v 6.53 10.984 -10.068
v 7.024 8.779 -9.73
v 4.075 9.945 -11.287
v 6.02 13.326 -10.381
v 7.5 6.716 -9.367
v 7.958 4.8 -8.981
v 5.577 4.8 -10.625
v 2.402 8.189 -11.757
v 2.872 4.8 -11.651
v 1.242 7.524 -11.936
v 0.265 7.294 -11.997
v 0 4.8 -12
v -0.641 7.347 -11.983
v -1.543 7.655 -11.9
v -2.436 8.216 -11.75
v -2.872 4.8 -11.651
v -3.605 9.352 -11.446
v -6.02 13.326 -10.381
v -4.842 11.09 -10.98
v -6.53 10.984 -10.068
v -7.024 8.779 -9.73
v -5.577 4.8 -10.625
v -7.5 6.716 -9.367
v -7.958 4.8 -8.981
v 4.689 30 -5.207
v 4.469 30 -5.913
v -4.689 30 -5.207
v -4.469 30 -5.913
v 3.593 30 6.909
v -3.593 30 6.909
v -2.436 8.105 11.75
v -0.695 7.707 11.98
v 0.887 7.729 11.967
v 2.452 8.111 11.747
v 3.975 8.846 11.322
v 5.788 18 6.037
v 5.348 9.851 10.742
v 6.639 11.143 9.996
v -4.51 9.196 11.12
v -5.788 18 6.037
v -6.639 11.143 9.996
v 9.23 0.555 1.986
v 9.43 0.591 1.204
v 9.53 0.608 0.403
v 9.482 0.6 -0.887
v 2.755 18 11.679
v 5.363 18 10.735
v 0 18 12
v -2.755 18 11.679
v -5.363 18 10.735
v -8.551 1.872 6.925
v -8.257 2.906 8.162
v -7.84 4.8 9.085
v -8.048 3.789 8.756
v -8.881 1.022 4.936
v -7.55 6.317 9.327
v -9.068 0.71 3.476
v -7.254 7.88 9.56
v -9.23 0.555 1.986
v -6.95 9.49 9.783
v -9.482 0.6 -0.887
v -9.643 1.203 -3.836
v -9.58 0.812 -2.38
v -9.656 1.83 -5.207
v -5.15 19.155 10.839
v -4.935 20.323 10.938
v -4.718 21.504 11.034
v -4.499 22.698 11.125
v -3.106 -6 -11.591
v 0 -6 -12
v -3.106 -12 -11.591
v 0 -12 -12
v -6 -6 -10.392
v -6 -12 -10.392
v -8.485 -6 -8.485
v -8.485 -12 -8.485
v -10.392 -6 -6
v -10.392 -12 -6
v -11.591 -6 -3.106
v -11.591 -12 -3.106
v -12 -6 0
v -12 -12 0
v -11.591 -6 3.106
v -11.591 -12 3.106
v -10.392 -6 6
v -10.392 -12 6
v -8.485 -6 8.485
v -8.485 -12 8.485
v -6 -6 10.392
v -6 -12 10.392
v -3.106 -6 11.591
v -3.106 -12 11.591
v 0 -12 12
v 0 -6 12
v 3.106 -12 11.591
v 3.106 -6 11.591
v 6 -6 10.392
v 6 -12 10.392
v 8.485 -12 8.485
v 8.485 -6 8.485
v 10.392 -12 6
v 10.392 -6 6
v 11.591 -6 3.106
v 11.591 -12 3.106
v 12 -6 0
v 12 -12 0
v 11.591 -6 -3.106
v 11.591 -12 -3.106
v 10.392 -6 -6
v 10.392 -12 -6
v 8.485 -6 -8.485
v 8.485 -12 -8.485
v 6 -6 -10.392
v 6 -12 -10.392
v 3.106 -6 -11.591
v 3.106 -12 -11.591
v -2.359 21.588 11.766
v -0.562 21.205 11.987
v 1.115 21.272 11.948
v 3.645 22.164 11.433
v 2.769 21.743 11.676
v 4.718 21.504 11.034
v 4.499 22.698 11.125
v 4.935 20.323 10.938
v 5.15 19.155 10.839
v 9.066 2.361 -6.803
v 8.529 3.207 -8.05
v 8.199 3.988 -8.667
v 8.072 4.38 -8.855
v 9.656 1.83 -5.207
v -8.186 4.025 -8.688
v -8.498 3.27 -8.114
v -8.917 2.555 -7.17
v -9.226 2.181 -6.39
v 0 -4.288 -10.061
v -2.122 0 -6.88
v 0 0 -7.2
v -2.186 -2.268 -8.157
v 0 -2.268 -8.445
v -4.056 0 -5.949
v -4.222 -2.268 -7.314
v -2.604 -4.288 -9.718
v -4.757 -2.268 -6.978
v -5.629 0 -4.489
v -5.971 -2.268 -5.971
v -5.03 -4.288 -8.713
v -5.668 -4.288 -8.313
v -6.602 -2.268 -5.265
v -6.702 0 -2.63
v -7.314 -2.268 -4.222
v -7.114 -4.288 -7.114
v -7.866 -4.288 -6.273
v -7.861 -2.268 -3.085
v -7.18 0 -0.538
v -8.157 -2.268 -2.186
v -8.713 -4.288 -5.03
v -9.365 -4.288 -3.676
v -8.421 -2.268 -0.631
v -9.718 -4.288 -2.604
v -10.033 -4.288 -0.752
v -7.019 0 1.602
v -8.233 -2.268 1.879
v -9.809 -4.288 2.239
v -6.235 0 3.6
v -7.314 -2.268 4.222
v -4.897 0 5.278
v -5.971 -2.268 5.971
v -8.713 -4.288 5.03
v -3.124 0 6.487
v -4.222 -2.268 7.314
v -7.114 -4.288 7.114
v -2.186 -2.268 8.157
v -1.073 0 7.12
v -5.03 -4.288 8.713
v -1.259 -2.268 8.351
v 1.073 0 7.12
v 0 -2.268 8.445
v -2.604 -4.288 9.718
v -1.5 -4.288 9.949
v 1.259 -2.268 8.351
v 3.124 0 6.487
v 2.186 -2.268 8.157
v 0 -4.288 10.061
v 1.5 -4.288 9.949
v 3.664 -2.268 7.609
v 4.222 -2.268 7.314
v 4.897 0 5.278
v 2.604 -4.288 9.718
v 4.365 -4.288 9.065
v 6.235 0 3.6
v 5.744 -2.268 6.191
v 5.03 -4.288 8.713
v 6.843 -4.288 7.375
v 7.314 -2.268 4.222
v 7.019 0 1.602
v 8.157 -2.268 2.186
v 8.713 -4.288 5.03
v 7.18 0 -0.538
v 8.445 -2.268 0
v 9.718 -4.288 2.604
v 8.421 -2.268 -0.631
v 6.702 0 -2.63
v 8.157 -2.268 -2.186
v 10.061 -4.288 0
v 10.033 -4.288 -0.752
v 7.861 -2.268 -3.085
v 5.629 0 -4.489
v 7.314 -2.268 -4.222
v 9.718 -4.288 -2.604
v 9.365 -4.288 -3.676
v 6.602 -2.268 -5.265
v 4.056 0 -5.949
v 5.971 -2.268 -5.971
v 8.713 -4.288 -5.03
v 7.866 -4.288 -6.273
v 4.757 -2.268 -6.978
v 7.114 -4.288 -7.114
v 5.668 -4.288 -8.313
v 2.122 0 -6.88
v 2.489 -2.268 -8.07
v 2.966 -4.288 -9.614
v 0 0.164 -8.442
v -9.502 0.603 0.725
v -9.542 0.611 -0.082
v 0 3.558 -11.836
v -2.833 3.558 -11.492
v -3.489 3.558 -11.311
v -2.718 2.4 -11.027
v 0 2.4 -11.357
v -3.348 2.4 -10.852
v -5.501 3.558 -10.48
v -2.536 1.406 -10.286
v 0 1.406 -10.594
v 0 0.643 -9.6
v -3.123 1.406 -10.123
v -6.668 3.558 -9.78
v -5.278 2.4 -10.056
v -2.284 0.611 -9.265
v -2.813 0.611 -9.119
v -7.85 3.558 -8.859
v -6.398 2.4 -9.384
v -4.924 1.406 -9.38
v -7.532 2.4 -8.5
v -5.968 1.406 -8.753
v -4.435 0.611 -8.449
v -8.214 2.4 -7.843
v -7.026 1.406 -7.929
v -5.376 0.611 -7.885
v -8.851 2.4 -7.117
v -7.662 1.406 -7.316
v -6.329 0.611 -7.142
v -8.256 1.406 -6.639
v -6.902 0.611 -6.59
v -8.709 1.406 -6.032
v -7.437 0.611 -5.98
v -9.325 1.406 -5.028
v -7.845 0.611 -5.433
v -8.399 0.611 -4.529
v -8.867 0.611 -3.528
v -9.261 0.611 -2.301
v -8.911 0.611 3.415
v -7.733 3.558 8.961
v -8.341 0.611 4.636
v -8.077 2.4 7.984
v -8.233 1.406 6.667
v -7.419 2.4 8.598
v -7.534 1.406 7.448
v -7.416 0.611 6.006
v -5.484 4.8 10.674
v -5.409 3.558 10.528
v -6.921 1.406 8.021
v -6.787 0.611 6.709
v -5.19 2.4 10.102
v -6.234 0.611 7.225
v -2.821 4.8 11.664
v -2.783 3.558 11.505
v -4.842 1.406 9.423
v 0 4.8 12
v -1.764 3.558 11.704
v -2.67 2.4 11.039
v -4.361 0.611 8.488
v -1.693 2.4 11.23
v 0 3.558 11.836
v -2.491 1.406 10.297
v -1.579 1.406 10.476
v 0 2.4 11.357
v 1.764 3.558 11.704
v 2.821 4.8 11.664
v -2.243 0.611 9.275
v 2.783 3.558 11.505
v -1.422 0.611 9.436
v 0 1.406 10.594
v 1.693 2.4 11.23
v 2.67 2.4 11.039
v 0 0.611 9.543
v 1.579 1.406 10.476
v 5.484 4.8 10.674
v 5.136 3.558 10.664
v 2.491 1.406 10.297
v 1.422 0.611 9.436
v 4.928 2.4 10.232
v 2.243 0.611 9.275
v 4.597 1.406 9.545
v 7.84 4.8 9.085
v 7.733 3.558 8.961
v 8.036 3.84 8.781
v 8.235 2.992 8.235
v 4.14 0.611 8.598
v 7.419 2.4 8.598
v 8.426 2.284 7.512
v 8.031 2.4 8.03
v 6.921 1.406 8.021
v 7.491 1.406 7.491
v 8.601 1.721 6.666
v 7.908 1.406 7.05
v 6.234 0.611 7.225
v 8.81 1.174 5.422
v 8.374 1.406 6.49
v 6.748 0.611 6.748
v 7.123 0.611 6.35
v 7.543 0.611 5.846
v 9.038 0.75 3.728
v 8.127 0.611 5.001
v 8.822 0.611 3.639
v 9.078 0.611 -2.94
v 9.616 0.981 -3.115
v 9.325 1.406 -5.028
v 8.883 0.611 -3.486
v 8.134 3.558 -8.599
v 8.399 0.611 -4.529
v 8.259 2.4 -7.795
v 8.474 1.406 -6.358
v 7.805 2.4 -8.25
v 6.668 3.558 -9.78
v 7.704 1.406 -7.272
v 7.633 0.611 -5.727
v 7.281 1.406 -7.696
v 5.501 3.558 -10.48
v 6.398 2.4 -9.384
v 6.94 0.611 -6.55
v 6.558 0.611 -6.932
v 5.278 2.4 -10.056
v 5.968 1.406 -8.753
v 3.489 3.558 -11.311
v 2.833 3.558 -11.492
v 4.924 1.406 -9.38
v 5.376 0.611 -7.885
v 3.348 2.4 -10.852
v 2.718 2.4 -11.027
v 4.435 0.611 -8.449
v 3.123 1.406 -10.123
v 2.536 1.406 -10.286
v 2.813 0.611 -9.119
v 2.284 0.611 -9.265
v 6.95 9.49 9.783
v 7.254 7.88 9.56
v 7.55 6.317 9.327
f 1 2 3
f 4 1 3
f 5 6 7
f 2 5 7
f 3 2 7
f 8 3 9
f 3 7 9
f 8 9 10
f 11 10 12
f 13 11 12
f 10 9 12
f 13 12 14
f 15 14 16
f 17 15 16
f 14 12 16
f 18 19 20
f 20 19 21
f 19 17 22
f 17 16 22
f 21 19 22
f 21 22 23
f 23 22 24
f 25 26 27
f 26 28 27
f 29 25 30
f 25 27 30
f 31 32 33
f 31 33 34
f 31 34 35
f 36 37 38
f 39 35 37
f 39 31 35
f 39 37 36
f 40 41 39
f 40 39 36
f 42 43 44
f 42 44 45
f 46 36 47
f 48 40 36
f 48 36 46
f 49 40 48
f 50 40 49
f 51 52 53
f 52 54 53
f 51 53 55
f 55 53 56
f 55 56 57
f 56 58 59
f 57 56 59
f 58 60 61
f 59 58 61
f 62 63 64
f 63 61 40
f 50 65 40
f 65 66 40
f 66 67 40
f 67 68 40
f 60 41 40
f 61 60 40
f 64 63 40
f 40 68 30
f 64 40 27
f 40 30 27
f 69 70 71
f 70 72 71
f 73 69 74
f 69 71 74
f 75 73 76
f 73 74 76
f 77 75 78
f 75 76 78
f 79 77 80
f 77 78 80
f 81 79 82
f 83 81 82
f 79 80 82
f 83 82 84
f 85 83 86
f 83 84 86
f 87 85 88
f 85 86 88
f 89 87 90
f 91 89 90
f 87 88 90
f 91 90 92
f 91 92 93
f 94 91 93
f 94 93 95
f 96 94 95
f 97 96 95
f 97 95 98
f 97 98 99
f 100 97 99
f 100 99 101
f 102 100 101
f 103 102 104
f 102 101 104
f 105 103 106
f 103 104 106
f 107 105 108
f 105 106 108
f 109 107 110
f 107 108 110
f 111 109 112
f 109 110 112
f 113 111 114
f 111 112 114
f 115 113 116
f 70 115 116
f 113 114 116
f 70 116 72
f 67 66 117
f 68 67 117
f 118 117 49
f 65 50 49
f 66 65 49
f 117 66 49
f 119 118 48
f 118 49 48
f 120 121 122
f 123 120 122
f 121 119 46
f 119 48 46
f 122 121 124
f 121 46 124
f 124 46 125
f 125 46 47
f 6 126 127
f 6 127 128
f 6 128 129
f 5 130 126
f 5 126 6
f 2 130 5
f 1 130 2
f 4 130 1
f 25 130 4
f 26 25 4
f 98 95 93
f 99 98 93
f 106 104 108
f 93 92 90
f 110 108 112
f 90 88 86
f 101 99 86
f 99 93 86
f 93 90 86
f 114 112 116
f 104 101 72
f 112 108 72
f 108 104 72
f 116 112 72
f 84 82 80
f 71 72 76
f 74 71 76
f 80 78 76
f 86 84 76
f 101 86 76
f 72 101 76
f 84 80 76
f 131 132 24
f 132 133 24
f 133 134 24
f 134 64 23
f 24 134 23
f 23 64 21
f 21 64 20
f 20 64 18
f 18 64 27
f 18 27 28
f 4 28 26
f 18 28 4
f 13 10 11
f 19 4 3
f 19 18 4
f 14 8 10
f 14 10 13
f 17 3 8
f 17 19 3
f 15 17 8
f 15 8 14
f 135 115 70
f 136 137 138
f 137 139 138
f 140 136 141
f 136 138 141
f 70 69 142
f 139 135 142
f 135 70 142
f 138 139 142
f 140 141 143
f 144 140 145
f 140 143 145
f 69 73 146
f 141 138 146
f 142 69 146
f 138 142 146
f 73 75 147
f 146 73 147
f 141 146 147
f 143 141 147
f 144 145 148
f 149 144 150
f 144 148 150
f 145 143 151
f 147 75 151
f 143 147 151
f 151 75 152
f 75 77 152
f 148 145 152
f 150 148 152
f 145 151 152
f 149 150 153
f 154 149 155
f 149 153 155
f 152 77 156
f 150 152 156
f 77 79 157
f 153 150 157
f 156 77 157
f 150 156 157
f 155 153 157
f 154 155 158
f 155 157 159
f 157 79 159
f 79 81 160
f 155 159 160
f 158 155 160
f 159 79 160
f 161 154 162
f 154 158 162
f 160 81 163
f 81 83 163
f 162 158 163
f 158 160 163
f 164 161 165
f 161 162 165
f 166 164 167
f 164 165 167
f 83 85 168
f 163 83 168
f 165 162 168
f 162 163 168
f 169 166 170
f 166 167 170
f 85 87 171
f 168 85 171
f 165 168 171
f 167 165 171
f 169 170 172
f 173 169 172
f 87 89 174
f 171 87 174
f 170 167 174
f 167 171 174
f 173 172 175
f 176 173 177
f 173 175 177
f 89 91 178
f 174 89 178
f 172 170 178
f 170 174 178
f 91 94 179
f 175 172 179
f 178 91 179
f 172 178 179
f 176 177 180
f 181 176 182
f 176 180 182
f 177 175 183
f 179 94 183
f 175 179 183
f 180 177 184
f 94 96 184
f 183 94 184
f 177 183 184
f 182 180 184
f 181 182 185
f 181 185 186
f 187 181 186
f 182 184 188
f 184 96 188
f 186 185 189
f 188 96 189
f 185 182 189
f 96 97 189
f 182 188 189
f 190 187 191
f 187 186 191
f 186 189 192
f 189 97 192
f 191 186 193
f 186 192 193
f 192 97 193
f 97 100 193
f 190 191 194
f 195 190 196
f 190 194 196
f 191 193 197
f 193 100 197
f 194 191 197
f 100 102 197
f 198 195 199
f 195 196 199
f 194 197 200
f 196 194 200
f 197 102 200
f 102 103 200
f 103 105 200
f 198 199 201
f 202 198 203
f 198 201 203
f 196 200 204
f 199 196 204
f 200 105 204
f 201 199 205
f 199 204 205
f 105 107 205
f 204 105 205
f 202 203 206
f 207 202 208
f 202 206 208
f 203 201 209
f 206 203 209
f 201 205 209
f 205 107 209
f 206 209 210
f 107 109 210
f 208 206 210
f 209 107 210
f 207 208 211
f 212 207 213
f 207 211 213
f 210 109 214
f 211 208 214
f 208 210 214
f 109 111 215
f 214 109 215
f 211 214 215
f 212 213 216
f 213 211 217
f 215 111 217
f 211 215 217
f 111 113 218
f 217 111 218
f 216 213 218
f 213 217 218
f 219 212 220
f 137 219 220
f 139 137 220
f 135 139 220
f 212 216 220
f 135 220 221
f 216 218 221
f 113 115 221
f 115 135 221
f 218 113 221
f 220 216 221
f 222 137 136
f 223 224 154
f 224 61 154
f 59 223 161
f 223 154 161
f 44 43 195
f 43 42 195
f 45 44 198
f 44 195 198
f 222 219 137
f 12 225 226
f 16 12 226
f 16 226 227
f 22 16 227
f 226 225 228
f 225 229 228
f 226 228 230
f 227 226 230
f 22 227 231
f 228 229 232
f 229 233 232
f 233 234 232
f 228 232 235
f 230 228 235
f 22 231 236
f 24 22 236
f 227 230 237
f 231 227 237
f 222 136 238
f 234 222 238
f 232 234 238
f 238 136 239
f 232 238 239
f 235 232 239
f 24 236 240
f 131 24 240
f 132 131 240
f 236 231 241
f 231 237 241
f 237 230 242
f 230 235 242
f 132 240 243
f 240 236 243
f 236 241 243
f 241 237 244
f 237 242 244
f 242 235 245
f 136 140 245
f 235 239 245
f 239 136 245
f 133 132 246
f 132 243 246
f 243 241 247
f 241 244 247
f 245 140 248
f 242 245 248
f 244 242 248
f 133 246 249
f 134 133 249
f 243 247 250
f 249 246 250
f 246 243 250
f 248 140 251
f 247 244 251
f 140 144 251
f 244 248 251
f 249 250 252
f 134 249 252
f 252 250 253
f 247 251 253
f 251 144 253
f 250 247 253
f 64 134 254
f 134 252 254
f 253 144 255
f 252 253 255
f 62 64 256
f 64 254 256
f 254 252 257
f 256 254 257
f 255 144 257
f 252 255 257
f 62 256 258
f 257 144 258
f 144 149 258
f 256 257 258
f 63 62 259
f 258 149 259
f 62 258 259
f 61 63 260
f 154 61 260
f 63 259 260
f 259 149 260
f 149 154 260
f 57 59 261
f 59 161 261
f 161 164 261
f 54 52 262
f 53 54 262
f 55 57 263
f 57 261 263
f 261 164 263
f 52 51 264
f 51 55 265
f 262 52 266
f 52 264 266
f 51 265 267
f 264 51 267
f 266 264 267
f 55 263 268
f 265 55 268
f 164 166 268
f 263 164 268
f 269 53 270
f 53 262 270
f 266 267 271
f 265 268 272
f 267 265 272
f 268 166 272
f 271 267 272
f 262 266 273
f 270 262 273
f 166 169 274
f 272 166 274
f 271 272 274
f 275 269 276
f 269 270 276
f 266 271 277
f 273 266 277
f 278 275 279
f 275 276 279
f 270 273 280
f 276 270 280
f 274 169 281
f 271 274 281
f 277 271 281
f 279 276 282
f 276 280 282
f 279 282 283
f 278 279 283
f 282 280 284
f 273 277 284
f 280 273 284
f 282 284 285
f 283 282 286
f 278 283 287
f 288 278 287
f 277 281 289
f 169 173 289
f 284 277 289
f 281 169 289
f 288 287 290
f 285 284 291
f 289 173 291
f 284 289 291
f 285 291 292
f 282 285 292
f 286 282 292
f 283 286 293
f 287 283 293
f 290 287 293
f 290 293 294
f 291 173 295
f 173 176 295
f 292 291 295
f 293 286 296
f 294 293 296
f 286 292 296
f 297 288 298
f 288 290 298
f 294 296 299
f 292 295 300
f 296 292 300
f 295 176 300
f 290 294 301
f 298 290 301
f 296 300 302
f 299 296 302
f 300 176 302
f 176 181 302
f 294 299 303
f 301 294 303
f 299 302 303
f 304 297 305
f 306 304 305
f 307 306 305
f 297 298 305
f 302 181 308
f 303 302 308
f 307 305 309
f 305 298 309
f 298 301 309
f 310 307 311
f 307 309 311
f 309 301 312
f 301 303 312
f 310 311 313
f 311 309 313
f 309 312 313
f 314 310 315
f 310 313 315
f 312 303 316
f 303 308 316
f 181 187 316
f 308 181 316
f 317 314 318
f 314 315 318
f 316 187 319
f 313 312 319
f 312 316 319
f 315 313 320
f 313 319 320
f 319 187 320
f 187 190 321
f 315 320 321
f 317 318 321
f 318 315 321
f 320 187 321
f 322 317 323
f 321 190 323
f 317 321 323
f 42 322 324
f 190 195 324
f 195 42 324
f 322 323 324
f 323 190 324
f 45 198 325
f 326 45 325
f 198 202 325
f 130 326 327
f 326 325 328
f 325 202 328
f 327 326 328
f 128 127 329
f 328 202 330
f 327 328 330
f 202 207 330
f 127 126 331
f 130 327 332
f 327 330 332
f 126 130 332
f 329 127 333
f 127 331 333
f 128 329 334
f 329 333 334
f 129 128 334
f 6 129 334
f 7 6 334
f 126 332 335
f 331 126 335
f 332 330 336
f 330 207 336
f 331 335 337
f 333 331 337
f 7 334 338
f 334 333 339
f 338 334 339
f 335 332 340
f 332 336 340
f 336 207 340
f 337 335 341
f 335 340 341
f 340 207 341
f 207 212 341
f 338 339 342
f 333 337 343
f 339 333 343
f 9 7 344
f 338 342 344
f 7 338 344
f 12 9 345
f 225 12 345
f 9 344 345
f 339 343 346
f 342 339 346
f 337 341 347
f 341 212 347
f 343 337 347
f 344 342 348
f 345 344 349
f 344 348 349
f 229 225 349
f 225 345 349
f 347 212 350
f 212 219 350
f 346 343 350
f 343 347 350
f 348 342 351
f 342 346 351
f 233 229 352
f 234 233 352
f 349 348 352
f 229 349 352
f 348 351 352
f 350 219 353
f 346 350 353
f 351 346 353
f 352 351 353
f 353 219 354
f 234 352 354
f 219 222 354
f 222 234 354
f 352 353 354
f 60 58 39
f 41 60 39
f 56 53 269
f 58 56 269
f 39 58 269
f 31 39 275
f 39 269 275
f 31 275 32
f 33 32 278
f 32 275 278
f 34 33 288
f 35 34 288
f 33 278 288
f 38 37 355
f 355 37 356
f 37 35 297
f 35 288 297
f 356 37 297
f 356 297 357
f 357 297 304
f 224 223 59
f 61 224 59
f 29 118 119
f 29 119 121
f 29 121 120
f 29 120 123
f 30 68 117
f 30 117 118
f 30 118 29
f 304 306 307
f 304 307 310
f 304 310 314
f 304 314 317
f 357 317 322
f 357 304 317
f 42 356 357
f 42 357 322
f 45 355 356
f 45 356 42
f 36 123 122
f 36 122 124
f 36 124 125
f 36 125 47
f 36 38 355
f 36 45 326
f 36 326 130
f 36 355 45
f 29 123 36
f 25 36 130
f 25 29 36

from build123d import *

# Parameters (mm, degrees)
CUT_EXTRUDE1_DEPTH      = 51
CUT_EXTRUDE2_DEPTH      = 58.445626587
CUT_EXTRUDE2_DEPTH_BACK = 58.445626587
SCALE_1_SCALE           = 0.6


with BuildPart() as part:
    # Sketch1 → Revolve1 (revolve)
    with BuildSketch(Plane(origin=(0, 0, 0), x_dir=(0, 0, -1), z_dir=(1, 0, 0)), mode=Mode.PRIVATE) as revolve1_sk:
        with BuildLine():
            Line((-20, -10), (-20, -20))
            Line((-20, -20), (0, -20))
            Line((0, -20), (0, 0))
            Line((0, 0), (0, 50))
            Line((0, 50), (-20, 50))
            Line((-20, 50), (-20, 8))
            ThreePointArc((-20, 8), (-17.656854249, 2.343145751), (-12, 0))
            ThreePointArc((-12, 0), (-15.348827212, -5.520938231), (-20, -10))
        make_face()
    revolve(revolve1_sk.sketch.rotate(Axis((0, -20, 0), (0, 1, 0)), 180), axis=Axis((0, -20, 0), (0, 1, 0)))

    # Sketch4 → Cut-Extrude1 (cut)
    with BuildSketch(Plane(origin=(-8.550503583, 48.49231552, 0), x_dir=(0, 0, -1), z_dir=(0.17364817766692414, -0.9848077530122091, 0))):
        with BuildLine():
            add(Edge.make_bspline(
                [(1.59e-07, 28.378563944), (-15.257193416, 28.378564063), (-19.289037435, 13.887286477)],
                knots=[4.712388972, 4.712388972, 4.712388972, 6.015750233, 6.015750233, 6.015750233], degree=2, weights=[1, 0.79506558, 1]))
            Line((-19.289037435, 13.887286477), (8.678255984, 16.378563944))
            Line((8.678255984, 16.378563944), (19.498892761, 13.063772103))
            add(Edge.make_bspline(
                [(19.498892761, 13.063772103), (15.950697723, 28.378563819), (1.59e-07, 28.378563944)],
                knots=[3.365916951, 3.365916951, 3.365916951, 4.712388972, 4.712388972, 4.712388972], degree=2, weights=[1, 0.781808048, 1]))
        make_face()
    cut_extrude1 = extrude(amount=CUT_EXTRUDE1_DEPTH, mode=Mode.SUBTRACT)

    # Mirror1: Cut-Extrude1 across plane
    add(cut_extrude1.mirror(Plane(origin=(0, 0, 0), x_dir=(0, 0, 1), z_dir=(1, 0, 0))), mode=Mode.SUBTRACT)

    # Sketch5 → Cut-Extrude2 (cut, two sides: drawn at the far end of the back side and taken through both)
    with BuildSketch(Plane(origin=(0, 0, 0), x_dir=(0, 0, -1), z_dir=(1, 0, 0)).offset(-CUT_EXTRUDE2_DEPTH_BACK)):
        Polygon((-24.056341891, 5.761102159), (-10.062007697, 30), (-23.062007697, 30), (-1.700047737, 67), (5.299952263, 67), (20.243066063, 11.231540074), (36.223701355, 75.285993596), (-11.110548582, 82.293611227), (-55.649834593, 36.467288671), align=None)
    extrude(amount=CUT_EXTRUDE2_DEPTH + CUT_EXTRUDE2_DEPTH_BACK, mode=Mode.SUBTRACT)


with BuildPart() as part_1:
    # 缩放比例1: scaled about (0, 0, 0)
    add(part.part.scale(SCALE_1_SCALE))


solid = part_1.part
